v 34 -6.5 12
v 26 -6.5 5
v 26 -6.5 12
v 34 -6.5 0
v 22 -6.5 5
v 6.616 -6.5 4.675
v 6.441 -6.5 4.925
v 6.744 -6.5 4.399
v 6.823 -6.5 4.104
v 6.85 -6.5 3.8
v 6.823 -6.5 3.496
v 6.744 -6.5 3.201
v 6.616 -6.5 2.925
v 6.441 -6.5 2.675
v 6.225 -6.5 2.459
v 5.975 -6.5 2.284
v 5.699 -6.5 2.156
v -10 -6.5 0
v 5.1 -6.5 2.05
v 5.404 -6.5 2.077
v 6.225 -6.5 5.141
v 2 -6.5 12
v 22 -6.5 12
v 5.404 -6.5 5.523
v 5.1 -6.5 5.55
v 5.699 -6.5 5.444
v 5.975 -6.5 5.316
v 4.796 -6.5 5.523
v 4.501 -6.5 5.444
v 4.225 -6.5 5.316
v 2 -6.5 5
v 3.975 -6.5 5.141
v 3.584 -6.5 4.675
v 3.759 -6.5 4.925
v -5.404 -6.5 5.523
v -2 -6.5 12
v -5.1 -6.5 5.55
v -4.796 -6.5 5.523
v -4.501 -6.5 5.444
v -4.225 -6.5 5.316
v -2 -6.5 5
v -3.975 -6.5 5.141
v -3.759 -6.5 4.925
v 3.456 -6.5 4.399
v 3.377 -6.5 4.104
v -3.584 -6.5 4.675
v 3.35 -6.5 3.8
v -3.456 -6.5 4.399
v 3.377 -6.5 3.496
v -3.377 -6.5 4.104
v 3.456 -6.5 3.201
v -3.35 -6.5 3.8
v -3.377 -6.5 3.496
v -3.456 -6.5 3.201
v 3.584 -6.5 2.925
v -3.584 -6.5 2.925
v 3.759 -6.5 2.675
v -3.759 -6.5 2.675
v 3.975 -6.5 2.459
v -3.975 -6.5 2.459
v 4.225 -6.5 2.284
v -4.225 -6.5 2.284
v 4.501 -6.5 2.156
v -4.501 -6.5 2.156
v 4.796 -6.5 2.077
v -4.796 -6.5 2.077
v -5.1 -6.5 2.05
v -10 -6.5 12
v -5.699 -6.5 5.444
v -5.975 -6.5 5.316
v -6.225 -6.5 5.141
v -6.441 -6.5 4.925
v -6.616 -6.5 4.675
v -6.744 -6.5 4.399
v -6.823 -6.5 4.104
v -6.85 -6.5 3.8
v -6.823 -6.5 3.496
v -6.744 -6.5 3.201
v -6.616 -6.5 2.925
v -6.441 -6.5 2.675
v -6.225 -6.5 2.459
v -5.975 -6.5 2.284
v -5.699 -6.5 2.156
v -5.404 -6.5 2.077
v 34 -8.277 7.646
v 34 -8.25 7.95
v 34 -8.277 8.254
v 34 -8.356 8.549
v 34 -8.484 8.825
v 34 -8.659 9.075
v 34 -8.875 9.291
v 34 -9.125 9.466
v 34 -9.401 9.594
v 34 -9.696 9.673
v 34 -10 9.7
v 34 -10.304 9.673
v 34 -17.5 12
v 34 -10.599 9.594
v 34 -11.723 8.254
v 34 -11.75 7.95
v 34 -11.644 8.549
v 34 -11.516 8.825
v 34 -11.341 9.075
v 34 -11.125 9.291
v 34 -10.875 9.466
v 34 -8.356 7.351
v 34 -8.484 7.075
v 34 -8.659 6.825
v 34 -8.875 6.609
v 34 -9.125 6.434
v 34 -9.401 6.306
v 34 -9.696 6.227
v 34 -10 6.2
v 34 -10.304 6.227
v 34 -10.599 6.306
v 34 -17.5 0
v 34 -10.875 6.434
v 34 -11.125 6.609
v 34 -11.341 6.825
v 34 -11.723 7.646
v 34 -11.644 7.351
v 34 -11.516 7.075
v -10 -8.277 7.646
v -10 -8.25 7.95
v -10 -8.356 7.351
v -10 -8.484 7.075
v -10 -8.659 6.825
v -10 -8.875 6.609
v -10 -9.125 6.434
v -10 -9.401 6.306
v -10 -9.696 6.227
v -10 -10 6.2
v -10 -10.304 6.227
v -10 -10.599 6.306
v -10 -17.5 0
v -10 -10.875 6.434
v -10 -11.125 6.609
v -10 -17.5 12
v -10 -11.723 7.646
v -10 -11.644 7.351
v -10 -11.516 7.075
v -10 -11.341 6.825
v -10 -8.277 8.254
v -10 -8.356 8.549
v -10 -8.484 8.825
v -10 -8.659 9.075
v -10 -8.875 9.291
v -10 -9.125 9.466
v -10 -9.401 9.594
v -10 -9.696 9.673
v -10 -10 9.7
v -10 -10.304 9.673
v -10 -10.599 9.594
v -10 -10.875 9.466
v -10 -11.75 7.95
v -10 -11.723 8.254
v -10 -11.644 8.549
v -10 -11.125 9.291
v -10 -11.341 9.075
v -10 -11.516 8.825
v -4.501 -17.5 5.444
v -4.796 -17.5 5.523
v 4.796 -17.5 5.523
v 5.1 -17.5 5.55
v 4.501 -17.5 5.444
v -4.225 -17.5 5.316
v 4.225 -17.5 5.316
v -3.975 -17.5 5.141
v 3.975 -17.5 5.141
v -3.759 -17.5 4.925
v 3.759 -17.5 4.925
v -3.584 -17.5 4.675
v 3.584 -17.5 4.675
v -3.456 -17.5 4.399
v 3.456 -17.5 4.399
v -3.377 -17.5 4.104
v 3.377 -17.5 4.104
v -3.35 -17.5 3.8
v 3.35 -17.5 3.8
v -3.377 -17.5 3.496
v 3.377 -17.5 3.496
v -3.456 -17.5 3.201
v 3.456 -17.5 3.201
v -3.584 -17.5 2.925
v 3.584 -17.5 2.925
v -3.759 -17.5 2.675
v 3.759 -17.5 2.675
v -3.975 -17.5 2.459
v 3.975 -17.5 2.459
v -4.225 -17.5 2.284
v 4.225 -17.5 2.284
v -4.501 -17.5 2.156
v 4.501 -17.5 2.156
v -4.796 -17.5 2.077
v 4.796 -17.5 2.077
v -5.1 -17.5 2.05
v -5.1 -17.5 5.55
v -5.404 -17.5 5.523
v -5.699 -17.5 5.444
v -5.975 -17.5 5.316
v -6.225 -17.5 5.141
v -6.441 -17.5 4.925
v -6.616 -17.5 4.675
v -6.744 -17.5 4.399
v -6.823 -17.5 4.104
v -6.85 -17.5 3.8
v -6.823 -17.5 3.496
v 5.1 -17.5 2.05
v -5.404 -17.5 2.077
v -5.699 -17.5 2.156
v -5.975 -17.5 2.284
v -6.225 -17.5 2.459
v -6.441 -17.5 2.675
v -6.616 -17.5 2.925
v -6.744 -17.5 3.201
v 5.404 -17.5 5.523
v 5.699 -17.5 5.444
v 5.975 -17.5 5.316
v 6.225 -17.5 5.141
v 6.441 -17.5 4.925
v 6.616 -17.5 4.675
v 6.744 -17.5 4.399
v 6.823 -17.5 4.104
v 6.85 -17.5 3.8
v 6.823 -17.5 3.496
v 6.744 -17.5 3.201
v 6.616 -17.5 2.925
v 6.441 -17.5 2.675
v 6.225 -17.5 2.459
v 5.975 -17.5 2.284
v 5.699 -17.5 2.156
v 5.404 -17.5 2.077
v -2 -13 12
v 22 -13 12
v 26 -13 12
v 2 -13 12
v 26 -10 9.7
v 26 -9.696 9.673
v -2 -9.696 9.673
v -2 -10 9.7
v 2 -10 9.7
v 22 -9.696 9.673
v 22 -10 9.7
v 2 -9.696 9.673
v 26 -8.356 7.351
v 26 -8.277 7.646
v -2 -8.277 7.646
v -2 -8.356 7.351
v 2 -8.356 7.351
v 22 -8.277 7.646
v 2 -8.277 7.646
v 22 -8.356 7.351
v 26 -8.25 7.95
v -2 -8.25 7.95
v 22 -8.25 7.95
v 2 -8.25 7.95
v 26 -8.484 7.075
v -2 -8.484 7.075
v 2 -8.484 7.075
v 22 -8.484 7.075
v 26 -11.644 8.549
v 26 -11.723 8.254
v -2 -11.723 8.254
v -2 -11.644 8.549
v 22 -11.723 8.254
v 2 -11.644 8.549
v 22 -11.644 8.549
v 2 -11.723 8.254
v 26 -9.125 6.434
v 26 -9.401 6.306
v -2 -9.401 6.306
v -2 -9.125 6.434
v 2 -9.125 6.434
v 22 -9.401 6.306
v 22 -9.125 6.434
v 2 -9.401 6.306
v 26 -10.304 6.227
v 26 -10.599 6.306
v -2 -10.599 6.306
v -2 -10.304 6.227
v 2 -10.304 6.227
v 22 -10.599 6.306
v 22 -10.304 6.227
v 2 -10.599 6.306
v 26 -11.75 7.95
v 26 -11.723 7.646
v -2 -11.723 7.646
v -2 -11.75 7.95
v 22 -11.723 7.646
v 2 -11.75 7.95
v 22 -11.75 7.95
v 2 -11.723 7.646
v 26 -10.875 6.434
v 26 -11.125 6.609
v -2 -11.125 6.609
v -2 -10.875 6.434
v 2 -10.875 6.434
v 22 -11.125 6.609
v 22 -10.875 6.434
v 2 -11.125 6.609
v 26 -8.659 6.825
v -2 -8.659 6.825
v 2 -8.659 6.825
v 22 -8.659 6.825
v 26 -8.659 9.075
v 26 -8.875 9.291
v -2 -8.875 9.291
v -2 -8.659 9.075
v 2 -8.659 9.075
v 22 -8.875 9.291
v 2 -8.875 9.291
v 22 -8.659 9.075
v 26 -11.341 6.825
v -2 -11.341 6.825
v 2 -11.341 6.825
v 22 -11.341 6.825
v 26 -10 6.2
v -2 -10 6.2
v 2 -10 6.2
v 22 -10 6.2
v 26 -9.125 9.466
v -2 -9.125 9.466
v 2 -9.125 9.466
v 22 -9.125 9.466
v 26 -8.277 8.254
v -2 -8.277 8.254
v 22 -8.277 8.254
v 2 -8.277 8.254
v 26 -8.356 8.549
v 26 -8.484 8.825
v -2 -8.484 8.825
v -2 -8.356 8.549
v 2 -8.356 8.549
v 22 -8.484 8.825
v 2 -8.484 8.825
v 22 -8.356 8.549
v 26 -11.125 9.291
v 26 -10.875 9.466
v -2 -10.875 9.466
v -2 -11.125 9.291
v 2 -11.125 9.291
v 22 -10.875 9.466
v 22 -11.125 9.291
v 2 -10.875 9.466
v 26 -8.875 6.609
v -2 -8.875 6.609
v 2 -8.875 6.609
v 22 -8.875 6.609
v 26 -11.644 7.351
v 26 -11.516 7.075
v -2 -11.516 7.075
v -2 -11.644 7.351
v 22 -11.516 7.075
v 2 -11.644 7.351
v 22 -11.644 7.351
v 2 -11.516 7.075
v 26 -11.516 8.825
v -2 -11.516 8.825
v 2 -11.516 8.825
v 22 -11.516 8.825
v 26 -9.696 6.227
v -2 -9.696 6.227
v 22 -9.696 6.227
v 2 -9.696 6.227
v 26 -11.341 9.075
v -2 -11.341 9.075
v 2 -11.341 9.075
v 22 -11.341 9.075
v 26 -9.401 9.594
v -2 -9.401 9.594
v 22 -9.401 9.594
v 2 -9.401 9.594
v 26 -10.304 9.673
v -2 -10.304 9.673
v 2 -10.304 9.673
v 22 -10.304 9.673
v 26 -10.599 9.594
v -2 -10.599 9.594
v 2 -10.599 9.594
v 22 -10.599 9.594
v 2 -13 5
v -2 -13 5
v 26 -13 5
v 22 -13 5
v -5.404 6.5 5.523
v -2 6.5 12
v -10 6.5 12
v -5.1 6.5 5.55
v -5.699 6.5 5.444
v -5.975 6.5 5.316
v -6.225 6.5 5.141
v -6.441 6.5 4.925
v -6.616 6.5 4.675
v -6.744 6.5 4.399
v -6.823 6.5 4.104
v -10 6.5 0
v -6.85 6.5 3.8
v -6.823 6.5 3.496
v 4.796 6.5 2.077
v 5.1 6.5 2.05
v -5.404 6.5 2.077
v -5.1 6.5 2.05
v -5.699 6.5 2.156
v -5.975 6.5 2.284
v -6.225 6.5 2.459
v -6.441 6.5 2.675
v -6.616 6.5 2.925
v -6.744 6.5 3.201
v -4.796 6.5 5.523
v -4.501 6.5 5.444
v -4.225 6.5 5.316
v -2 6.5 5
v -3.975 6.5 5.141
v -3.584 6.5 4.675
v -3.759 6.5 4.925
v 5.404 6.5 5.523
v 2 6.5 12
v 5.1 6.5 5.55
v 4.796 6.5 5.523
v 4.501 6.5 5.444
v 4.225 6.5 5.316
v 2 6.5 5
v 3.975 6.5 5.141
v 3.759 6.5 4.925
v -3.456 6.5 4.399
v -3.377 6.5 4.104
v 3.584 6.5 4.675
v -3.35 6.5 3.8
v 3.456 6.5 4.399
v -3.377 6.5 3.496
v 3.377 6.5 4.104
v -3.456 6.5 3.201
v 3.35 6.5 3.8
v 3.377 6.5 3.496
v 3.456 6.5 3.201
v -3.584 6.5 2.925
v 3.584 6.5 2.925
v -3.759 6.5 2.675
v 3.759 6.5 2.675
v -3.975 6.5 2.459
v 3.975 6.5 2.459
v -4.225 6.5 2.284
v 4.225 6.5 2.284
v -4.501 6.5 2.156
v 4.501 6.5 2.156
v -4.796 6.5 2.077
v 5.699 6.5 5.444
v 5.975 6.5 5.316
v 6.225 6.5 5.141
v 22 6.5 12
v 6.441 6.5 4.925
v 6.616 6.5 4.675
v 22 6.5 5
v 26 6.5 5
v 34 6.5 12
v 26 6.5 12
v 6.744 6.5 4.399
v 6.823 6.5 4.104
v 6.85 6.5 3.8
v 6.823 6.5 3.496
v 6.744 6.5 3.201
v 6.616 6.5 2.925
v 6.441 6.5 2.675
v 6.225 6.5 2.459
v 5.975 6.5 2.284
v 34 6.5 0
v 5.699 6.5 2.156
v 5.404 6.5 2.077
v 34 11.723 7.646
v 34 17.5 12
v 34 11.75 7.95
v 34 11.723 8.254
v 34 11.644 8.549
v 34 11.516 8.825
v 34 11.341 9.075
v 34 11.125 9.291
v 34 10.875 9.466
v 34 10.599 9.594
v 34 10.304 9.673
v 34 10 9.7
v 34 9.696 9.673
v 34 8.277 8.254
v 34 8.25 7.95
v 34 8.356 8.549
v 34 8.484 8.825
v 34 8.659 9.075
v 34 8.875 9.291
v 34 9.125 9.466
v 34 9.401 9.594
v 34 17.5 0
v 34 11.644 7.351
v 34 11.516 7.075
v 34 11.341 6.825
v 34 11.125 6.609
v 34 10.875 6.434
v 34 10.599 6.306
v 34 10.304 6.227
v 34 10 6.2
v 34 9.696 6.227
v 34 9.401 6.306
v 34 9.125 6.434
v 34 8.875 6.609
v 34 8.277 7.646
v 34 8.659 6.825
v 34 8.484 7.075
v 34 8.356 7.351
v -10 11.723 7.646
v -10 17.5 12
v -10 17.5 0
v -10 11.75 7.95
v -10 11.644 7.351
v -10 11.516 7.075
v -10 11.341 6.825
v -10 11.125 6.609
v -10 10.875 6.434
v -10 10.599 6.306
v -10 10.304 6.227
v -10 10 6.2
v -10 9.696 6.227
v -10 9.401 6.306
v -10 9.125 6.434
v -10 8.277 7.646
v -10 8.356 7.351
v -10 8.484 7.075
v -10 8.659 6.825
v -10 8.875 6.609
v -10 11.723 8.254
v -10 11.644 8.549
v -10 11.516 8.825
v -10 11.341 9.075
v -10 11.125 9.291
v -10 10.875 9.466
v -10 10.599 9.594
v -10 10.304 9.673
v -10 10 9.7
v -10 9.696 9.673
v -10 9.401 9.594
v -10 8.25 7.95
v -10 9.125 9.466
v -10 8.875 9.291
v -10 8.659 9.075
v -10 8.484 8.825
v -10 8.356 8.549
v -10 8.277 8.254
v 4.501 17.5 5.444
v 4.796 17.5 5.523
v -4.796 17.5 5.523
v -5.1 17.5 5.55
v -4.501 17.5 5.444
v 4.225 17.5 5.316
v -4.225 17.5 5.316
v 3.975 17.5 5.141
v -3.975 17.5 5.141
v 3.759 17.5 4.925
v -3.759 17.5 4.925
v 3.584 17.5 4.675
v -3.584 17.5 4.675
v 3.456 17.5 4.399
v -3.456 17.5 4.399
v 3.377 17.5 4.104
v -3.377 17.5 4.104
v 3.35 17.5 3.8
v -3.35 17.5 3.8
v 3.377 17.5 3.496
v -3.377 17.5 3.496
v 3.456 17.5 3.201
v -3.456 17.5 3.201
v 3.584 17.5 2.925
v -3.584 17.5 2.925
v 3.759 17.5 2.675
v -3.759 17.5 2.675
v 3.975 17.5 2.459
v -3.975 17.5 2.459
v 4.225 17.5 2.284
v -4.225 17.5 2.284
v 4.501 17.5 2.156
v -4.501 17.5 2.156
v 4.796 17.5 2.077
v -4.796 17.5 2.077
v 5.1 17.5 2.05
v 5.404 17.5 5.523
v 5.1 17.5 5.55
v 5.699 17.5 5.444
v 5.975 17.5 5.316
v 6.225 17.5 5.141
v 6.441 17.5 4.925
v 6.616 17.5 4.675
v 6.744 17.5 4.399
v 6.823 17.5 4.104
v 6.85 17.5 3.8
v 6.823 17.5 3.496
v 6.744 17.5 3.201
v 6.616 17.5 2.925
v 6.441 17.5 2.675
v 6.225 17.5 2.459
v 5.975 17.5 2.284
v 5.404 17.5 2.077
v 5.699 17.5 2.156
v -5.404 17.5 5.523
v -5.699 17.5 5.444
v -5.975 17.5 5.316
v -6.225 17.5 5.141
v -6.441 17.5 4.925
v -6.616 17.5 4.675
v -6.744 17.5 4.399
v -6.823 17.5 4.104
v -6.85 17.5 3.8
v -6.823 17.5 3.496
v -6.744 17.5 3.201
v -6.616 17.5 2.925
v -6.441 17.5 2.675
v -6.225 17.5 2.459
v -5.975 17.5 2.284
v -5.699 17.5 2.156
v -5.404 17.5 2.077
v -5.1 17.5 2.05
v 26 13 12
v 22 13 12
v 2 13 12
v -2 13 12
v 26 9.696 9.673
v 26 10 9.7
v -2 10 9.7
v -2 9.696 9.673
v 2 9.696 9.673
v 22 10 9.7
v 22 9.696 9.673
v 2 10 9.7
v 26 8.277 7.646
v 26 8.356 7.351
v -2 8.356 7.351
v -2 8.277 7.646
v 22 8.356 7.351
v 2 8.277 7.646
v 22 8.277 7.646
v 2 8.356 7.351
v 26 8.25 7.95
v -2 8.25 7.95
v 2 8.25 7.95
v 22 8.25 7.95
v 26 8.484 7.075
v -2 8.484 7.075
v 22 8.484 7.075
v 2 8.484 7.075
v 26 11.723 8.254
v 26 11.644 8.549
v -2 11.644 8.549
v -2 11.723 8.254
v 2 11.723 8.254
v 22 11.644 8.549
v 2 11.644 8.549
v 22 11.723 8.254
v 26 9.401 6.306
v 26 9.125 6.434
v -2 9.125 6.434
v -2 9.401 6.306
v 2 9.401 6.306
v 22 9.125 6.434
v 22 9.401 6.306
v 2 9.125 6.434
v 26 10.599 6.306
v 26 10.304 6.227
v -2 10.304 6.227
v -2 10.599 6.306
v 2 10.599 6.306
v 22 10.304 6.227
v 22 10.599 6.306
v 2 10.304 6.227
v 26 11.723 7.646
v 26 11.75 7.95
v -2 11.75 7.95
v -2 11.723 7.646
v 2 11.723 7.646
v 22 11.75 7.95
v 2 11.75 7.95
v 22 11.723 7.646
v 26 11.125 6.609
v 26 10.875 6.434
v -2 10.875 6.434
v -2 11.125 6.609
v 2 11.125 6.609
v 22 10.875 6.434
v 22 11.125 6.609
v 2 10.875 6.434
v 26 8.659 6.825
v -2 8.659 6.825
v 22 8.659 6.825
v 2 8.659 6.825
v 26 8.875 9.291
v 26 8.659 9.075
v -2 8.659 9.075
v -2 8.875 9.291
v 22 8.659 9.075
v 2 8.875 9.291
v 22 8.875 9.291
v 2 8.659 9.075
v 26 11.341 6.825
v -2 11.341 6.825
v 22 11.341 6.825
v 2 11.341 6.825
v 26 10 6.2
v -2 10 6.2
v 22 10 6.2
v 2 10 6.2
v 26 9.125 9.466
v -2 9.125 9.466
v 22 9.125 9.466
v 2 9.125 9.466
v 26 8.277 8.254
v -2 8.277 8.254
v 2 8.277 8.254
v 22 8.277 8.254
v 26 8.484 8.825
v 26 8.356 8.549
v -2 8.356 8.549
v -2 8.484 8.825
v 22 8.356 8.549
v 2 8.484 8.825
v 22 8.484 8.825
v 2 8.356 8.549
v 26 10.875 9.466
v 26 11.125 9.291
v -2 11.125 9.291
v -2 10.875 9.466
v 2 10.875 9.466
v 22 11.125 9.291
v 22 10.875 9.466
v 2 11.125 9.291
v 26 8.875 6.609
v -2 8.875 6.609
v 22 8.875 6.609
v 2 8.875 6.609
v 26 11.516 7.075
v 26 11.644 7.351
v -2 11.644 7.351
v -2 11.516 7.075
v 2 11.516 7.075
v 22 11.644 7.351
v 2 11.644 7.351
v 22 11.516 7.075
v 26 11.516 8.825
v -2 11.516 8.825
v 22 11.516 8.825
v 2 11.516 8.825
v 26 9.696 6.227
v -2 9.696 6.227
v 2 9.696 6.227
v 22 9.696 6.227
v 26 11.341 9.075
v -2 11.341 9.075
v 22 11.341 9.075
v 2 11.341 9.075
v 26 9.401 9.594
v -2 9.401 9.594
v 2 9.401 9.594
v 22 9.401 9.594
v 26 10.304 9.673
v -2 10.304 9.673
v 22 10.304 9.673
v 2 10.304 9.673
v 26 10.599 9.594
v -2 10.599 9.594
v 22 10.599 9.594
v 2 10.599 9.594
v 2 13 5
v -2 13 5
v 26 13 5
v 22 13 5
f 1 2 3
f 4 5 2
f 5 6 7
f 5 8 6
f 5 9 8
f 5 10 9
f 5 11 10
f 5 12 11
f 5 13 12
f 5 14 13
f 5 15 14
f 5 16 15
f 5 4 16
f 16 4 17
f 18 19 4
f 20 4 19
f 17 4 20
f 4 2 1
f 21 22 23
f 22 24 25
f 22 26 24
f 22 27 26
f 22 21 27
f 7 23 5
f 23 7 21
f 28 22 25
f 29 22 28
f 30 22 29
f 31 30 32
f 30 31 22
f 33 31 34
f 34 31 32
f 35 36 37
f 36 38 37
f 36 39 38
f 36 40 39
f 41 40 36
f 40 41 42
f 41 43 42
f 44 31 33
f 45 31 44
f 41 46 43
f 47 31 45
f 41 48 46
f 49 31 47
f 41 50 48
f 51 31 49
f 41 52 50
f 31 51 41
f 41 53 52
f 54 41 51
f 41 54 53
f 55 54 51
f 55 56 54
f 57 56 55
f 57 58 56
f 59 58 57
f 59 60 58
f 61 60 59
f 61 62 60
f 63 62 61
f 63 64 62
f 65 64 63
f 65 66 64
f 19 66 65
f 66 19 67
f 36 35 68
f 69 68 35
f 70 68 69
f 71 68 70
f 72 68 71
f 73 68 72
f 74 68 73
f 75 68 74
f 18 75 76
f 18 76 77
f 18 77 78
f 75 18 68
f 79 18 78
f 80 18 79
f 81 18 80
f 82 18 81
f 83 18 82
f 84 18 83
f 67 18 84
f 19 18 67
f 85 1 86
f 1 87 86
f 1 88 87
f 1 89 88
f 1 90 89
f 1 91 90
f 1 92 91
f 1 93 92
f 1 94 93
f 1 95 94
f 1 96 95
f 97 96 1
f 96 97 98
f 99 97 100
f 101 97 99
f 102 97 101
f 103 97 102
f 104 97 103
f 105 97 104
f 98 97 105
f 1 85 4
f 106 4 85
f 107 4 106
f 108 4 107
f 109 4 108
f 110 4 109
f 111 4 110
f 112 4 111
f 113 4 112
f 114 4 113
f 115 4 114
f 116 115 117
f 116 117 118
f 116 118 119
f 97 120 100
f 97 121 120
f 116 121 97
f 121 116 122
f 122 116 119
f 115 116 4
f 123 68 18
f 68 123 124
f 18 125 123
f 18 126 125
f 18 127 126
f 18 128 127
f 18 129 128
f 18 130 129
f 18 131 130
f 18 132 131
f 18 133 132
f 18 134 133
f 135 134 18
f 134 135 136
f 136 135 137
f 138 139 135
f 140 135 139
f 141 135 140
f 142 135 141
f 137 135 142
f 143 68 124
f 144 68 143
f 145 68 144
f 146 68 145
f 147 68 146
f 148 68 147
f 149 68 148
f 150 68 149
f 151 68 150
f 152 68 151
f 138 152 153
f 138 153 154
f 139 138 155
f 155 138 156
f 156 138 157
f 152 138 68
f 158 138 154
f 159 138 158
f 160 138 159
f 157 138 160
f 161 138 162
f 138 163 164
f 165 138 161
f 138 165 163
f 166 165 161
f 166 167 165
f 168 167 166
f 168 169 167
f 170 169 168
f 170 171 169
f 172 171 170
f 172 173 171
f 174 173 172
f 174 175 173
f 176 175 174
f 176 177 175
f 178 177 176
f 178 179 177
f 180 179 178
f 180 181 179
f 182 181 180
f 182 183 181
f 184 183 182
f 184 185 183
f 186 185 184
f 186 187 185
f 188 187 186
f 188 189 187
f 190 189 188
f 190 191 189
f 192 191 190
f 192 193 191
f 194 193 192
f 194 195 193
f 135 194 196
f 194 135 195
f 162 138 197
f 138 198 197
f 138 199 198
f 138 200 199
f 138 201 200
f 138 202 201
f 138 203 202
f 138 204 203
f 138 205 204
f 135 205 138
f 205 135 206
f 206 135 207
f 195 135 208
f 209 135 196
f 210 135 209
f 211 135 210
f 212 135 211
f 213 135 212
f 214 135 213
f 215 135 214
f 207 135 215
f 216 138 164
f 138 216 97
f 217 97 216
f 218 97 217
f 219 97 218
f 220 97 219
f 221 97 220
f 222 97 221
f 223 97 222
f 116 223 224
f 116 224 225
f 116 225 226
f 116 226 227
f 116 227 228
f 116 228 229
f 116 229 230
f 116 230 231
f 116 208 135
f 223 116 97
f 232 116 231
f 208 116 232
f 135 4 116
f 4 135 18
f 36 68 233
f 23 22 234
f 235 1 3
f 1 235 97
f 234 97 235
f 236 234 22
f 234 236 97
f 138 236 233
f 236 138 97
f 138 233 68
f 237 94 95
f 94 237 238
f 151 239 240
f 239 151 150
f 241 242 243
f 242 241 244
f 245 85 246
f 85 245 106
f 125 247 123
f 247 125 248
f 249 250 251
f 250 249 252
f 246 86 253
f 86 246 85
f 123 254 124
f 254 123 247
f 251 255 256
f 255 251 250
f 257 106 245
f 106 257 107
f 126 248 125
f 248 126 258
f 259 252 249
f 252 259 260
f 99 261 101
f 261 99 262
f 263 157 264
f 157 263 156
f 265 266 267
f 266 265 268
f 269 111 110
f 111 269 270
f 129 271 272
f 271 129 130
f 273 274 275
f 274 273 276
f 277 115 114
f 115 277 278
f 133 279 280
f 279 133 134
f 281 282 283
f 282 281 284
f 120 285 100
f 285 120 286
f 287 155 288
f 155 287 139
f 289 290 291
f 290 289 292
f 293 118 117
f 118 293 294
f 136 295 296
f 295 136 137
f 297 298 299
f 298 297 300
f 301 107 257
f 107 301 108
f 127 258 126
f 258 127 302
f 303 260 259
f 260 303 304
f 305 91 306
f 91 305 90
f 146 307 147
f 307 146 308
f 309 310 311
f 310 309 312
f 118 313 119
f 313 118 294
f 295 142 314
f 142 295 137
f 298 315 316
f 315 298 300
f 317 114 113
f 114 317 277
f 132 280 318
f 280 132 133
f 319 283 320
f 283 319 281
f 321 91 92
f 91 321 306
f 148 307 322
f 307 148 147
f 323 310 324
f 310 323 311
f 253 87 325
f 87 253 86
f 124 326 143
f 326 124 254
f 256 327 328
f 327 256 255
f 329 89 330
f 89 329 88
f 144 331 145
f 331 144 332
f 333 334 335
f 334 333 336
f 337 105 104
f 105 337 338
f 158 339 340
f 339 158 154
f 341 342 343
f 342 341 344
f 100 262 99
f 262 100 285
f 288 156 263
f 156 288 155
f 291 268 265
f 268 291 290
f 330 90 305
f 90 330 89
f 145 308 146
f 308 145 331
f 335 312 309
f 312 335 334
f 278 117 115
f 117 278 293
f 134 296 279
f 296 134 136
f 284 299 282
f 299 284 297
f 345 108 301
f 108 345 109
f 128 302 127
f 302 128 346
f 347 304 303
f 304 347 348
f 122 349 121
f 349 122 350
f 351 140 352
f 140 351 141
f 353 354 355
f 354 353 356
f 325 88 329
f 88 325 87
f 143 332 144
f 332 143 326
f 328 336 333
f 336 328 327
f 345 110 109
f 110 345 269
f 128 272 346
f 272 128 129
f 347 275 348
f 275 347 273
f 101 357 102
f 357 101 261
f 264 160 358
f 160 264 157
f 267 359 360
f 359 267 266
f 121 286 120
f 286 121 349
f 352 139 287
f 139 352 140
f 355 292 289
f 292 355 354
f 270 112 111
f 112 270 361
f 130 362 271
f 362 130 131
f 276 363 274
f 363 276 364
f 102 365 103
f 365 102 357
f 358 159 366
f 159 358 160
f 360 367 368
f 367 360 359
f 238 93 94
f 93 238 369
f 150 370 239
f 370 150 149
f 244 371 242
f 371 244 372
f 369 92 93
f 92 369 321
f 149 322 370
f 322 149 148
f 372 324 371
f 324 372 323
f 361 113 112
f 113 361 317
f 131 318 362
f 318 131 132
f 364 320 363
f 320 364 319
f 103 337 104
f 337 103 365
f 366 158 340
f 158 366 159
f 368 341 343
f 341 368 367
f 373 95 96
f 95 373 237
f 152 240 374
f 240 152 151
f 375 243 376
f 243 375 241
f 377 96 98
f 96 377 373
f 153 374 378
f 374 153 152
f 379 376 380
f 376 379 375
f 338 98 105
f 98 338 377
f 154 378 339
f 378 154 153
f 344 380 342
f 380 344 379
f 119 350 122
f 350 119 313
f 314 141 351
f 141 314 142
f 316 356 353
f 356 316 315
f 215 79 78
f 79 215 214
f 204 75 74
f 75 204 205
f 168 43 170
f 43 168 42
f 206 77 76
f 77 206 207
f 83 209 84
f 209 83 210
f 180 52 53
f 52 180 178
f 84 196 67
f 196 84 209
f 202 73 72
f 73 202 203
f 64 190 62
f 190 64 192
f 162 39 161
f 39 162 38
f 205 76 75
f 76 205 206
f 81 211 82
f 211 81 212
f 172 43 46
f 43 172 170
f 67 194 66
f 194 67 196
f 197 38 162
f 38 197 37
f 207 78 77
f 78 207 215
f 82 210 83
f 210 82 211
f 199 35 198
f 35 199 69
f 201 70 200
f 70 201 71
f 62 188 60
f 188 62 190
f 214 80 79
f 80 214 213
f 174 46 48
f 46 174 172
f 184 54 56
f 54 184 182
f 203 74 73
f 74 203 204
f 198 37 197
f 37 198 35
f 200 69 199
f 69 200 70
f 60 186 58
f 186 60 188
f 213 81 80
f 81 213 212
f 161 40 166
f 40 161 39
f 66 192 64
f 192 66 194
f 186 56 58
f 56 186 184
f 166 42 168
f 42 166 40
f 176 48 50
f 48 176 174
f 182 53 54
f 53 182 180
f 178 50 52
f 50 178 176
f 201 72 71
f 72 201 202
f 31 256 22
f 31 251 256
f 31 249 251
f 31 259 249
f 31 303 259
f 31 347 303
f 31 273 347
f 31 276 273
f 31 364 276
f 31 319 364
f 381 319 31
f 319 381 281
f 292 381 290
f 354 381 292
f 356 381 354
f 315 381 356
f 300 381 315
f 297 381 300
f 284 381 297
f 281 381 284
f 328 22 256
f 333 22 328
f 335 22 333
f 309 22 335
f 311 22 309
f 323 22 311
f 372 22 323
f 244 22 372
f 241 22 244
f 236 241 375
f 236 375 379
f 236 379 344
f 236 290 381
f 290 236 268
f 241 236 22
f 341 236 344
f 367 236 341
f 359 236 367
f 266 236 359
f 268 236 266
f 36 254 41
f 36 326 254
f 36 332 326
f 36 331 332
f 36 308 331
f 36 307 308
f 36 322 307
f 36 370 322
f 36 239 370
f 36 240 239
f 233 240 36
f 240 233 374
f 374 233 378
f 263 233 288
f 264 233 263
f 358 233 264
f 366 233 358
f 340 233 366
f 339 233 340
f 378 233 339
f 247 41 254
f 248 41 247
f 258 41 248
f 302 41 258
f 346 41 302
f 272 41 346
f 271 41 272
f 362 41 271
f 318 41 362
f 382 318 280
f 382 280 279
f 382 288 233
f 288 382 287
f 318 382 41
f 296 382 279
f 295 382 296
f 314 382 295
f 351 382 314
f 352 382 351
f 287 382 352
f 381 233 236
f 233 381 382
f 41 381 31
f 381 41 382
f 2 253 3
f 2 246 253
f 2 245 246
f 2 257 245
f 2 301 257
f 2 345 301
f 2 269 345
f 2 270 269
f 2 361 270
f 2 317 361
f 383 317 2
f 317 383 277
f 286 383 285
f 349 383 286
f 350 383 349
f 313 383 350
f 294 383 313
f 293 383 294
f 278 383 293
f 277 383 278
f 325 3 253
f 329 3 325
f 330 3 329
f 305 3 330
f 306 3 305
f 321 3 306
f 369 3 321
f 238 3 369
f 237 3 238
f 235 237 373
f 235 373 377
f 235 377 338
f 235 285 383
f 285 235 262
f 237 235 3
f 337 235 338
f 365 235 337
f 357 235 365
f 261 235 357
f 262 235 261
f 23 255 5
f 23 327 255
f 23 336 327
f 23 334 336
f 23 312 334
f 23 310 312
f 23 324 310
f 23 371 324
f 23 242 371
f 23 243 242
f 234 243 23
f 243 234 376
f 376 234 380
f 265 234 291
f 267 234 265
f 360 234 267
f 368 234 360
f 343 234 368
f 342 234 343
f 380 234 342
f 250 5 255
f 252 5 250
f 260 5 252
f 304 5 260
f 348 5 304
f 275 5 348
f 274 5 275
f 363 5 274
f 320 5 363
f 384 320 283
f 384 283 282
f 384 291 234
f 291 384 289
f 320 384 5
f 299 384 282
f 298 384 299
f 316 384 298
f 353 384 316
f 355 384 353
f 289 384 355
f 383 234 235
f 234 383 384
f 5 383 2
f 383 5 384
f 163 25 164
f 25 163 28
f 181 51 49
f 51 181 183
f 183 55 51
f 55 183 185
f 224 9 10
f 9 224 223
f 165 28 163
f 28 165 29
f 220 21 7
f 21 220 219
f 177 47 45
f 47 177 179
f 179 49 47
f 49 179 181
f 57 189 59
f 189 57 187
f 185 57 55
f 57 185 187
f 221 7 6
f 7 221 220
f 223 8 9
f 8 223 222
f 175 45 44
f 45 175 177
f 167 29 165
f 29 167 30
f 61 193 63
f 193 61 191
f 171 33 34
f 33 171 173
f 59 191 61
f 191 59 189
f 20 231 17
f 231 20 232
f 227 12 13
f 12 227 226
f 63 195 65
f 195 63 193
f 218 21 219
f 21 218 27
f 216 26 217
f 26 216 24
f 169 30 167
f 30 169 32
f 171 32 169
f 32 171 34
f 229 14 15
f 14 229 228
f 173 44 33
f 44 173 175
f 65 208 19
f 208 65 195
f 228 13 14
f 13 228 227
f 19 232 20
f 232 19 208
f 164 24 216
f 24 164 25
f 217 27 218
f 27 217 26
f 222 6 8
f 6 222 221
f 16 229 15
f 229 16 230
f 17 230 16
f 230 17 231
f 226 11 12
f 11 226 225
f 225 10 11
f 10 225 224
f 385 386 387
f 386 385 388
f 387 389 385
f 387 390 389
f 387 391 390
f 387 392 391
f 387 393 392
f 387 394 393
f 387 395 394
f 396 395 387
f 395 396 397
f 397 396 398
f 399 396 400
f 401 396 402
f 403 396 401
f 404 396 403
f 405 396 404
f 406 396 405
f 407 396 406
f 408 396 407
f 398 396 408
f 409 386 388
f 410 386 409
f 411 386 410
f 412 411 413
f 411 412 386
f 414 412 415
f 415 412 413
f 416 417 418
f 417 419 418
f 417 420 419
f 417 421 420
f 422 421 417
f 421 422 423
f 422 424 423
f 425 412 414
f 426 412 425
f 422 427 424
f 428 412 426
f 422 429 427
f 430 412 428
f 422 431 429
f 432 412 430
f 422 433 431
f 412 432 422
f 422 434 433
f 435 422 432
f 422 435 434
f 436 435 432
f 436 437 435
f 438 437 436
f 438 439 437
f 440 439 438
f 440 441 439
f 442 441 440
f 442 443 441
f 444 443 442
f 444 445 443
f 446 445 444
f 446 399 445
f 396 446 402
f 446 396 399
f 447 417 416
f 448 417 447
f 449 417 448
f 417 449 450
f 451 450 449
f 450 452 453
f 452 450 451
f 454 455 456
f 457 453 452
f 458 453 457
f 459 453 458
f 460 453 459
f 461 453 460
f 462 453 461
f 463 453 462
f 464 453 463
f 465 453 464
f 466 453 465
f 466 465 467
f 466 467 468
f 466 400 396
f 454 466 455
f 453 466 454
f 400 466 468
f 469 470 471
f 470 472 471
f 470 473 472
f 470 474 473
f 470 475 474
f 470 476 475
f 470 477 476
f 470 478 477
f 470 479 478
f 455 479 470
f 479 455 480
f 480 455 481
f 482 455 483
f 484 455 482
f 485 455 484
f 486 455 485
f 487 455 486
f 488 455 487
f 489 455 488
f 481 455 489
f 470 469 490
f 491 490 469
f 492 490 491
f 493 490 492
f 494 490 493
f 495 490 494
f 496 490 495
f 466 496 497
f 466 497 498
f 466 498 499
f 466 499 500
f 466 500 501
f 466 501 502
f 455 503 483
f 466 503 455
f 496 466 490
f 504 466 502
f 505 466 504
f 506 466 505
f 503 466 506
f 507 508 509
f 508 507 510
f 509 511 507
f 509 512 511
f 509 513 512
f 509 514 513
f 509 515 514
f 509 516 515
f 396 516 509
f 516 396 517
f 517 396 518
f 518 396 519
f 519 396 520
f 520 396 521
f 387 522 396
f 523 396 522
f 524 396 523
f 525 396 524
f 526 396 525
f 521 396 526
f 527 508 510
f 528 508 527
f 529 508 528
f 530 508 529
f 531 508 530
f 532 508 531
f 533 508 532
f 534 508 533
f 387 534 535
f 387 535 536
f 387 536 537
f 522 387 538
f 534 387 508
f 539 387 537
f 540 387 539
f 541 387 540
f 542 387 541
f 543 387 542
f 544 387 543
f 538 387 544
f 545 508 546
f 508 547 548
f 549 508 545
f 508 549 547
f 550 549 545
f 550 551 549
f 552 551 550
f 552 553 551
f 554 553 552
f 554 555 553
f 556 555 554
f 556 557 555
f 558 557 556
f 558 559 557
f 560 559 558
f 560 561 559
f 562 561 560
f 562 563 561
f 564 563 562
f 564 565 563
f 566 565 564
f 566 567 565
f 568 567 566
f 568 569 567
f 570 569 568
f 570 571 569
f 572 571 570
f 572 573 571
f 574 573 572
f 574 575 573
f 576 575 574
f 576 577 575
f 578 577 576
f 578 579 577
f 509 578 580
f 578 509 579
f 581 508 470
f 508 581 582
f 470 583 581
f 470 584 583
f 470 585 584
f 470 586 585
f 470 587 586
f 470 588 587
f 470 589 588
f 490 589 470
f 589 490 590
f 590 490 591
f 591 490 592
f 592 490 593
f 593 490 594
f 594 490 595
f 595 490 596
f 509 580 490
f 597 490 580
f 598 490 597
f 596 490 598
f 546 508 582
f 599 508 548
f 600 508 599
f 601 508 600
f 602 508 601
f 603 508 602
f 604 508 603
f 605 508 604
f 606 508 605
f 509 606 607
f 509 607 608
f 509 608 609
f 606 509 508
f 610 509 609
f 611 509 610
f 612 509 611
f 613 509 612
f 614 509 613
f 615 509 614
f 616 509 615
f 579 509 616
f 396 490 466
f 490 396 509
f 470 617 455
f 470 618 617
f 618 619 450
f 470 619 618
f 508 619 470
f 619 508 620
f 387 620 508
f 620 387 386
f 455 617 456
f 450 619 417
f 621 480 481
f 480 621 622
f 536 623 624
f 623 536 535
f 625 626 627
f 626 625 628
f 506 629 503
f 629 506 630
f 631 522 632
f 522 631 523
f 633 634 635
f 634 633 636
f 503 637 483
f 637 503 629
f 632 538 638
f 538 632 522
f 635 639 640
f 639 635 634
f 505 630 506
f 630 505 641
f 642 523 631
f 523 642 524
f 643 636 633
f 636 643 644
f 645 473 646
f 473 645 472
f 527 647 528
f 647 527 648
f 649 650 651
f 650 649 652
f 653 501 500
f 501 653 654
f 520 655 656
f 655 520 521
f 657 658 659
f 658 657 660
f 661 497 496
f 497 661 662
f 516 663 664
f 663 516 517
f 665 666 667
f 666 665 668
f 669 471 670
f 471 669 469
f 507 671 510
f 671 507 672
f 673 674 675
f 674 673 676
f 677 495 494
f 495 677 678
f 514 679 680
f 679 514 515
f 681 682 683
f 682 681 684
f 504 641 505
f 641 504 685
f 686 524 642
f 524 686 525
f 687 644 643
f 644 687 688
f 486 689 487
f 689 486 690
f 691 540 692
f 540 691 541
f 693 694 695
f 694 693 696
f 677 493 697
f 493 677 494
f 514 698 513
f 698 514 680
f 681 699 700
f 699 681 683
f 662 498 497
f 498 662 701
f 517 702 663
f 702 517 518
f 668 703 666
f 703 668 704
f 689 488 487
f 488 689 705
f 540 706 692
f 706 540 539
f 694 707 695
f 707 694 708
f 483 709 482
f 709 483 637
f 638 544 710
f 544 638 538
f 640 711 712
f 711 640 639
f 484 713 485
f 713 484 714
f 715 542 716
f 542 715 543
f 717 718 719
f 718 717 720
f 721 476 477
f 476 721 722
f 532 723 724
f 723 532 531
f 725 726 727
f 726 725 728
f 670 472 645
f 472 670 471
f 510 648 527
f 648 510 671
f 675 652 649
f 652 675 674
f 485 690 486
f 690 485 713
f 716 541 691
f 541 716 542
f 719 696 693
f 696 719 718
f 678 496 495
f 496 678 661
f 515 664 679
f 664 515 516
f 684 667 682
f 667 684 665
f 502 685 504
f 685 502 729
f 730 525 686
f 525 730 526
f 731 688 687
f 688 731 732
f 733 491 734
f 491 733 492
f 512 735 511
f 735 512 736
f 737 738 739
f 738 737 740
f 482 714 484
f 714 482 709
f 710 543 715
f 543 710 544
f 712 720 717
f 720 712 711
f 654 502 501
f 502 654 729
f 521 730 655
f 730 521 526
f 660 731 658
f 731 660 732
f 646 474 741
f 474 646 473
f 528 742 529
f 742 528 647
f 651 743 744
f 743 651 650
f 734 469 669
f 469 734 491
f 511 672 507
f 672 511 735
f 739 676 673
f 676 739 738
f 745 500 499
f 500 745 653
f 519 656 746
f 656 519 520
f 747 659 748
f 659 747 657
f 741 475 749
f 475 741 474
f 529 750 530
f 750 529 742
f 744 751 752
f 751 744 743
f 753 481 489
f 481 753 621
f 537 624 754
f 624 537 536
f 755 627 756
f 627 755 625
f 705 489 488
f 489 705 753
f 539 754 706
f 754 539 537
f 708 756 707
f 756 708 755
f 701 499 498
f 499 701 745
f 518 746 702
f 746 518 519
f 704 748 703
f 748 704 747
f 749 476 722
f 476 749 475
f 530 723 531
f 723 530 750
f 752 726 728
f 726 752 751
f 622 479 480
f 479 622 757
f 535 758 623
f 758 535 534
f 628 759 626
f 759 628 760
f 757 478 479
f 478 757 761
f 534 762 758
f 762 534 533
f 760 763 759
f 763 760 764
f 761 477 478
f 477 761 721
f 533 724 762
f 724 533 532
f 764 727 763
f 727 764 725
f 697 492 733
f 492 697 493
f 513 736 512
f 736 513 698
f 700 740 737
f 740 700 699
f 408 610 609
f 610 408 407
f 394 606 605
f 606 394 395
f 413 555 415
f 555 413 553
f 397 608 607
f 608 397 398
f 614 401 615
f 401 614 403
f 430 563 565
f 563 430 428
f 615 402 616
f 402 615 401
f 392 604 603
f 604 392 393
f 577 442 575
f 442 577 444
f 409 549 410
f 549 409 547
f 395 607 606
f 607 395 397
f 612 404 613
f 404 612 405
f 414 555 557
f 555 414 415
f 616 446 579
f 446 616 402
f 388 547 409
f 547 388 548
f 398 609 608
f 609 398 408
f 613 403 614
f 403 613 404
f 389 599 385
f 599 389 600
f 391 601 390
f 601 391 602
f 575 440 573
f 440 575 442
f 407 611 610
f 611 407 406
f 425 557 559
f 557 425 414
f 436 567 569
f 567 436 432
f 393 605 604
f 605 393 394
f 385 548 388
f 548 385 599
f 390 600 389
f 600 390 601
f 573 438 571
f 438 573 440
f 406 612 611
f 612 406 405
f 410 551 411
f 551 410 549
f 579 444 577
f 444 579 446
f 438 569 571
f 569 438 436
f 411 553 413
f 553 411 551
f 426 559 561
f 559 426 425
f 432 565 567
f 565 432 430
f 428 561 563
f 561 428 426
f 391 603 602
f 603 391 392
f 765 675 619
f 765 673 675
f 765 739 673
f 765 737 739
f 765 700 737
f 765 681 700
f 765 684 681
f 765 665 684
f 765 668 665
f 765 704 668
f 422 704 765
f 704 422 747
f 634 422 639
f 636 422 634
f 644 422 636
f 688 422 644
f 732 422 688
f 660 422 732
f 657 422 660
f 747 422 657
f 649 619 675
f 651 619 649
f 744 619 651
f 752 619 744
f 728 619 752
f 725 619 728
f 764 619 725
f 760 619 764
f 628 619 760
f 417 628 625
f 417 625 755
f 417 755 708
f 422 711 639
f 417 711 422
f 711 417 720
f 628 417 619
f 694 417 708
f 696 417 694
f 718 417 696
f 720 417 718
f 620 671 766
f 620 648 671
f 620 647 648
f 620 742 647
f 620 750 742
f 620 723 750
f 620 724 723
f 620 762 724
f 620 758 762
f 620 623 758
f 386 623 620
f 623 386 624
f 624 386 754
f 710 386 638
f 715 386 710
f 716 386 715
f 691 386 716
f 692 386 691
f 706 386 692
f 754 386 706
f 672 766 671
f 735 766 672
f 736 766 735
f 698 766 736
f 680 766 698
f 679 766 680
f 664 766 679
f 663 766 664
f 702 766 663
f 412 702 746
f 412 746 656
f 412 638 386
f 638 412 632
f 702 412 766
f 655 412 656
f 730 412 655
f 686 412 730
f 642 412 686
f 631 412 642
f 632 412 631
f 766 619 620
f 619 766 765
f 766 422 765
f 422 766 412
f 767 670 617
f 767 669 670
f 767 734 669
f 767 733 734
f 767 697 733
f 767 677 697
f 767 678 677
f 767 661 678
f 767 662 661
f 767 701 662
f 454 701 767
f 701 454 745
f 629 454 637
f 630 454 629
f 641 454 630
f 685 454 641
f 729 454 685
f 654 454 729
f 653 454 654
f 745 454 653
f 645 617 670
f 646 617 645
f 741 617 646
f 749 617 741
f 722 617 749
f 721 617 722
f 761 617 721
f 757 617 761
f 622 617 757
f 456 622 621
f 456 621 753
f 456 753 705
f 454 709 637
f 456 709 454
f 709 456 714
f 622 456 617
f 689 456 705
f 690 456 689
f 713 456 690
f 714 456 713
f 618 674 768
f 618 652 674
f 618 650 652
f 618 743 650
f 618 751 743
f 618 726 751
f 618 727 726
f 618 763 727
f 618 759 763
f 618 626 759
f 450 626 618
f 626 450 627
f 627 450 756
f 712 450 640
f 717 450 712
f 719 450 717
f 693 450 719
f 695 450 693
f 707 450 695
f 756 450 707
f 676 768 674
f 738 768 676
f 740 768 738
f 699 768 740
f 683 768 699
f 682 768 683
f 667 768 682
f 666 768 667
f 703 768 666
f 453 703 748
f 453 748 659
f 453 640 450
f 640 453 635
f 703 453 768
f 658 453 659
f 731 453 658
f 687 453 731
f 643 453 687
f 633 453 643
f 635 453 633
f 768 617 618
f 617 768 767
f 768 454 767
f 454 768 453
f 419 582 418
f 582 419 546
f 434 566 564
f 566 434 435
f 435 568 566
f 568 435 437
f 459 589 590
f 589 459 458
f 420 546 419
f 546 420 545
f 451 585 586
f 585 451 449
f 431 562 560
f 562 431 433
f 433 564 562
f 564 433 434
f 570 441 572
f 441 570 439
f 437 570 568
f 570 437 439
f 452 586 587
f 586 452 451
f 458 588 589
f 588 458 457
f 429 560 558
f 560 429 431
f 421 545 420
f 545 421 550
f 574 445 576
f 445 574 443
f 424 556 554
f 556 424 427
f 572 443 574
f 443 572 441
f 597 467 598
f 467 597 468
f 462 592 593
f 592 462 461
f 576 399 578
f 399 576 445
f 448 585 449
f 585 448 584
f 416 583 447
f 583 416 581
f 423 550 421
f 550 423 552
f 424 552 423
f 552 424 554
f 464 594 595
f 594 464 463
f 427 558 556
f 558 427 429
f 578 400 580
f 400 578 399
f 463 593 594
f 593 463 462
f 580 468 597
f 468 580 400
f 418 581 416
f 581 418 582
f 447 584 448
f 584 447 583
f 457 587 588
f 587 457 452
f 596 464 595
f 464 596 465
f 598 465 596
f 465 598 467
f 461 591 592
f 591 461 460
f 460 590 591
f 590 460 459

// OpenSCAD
// file: raspirobot.scad
body_roundedness = 4;

body_thickness = 3;
body_width = 65;
body_length = 100;

body_offset = 0;

upper_body_offset = 24;

raspi_width = 56;
raspi_length = 85.6;
raspi_height = 21;
raspi_base = 3.6;
raspi_offset_y = 0.35;

raspi_holes = [
    [24.5, 39],
    [-24.5, 39],
    [24.5, -19],
    [-24.5, -19]
];

servo_holes = [
    [-14, -5],
    [-14, -15],
    [35, -5],
    [35, -15]
];

raspi_hole_size = 3.5;

servo_width = 40;
servo_length = 35;
servo_height = 20;

servo_spread = 6;
servo_pos = 20;

wheel_diameter = 56;
wheel_thickness = 5;
wheel_offset = 16.5;
wheel_pos = 20;

support_wheel_radius =
      wheel_diameter/2
    - servo_height/2
    - body_thickness/2;
    
support_wheel_pos = -30;

module tubes() {
    linear_extrude(
        height = 3
    ) {
        for (hole = raspi_holes) {
            translate(hole)
            difference() {
                circle(d = raspi_hole_size + 1, $fn=30);
                circle(d = raspi_hole_size, $fn=30);
            }
        }
    }
}


module body_shape() {
        difference() {
            offset(r = body_roundedness) {
                scale([
                    body_width - 2*body_roundedness,
                    body_length - 2*body_roundedness
                ])
                square(1, center = true);
            }
            for (hole = raspi_holes) {
                translate(hole)
                circle(d=raspi_hole_size, $fn=30);
            }
    }
}


module body() {
    linear_extrude(
        height = body_thickness
    ) {
        body_shape();
    }
}

module support_wheel() {
    wheel_width=10;
    
    translate([0,0,-support_wheel_radius/2])
    color("black")
    rotate([0,90,0])
    cylinder(h=wheel_width, d=support_wheel_radius, center=true);
    
    translate([wheel_width/2,-support_wheel_radius/2,0])
    rotate([0,90,0])
    color("silver")
    linear_extrude(
        height=2
    ) {
      polygon([
        [0,0],
        [0,support_wheel_radius],
        [support_wheel_radius/2, support_wheel_radius/2]
      ]);
    }
    
    translate([-wheel_width/2 - 2,-support_wheel_radius/2,0])
    rotate([0,90,0])
    color("silver")
    linear_extrude(
        height=2
    ) {
      polygon([
        [0,0],
        [0,support_wheel_radius],
        [support_wheel_radius/2, support_wheel_radius/2]
      ]);
    }
}

module spacer(hole_pos) {
    difference() {
        translate([-2,
                    1,
                    upper_body_offset/2
                    + body_offset/2])
        scale([11, 12, servo_height
                        + upper_body_offset
                        + body_offset])
        cube(center=true);
        
        translate([0, -hole_pos, 0])
        cylinder(
            h=servo_height+2*upper_body_offset + 4,
            d=raspi_hole_size,
            center=true,
            $fn=36);
        
        translate([0, 3.2, -5.1])
        rotate([0, 90, 0])
        cylinder(
            h=20,
            d=3.5,
            center=true,
            $fn=36);
            
        translate([2, -3, 0])
        scale([10,10,4])
        cube(center=true);
        
        translate([2, -3, 24])
        scale([10,10,4])
        cube(center=true);
        
        translate([0, 3.2, 5.1])
        rotate([0, 90, 0])
        cylinder(
            h=20,
            d=3.5,
            center=true,
            $fn=36);
    }
}

module spacer1() {
    spacer(0.95);
}

module spacer2() {
    scale([-1,1,1]) spacer(0.95);
}

// rotate( [ 90, 0, 0 ] ) {
rotate( [30, 0, 0] ) rotate ( [0, 0, 45] ){
// rotate( [30, 0, 0] ) rotate ( [0, 0, 135] ){

// rotate( [-30, 0, 0] ) rotate ( [0, 0, 45] ){

for (hole_xy = raspi_holes) {
    color("silver")
    translate([hole_xy[0], hole_xy[1], 12.5])
    import("m3nut.stl");
    color("silver")
    translate([hole_xy[0], hole_xy[1], -3.1])
    scale([1,1,-1])
    import("m3x20.stl");
    color("silver")
    translate([hole_xy[0], hole_xy[1], -12])
    import("m3nut.stl");
    color("silver")
    translate([hole_xy[0], hole_xy[1], 11.4])
    import("m3x20.stl");
}

for (hole_yz = servo_holes) {
    color("silver")
    translate([18.5, hole_yz[0], hole_yz[1]])
    rotate([0, 90, 0])
    import("m3nut.stl");
    color("silver")
    translate([14, hole_yz[0], hole_yz[1]])
    rotate([0, 90, 0])
    import("m3x20.stl");
    color("silver")
    translate([-20.9, hole_yz[0], hole_yz[1]])
    rotate([0, 90, 0])
    import("m3nut.stl");
    color("silver")
    translate([-14, hole_yz[0], hole_yz[1]])
    rotate([0, -90, 0])
    import("m3x20.stl");
}

translate([-24.5, -17.5, -servo_height/2 - body_offset])
color("pink")
spacer1();

translate([24.5, -17.5, -servo_height/2 - body_offset])
color("pink")
spacer2();

translate([-24.5, 38, -servo_height/2 - body_offset])
rotate([0,0,180])
color("pink")
spacer2();

translate([24.5, 38, -servo_height/2 - body_offset])
rotate([0,0,180])
color("pink")
spacer1();


translate([0,0,-servo_height - body_thickness - body_offset])
body();
 
translate([0,0,upper_body_offset])
body();

translate([
    raspi_width/2 + wheel_thickness + wheel_offset,
    wheel_pos,
    -body_thickness - servo_height/2 - body_offset
])
rotate([0, 90, 0])
color("grey")
cylinder(h=wheel_thickness, r=wheel_diameter/2, center=true);

translate([
    -raspi_width/2 - wheel_thickness - wheel_offset,
    wheel_pos,
    -body_thickness - servo_height/2 - body_offset
])
rotate([0, 90, 0])
color("grey")
cylinder(
    h=wheel_thickness,
    r=wheel_diameter/2,
    center=true
);

color("pink")
translate(
    [0,
     0,
     upper_body_offset + body_thickness + 0.1
])
tubes();

translate([
    0,
    support_wheel_pos,
    -(servo_height + body_thickness + body_offset)
])
support_wheel();


translate([
    raspi_width/2,
    -raspi_length/2 + raspi_offset_y,
    upper_body_offset+body_thickness+raspi_base
])
rotate([0,0,90])
color("green")
import("raspberrypi2.stl");

translate([
    -servo_spread,
    servo_pos,
    -(servo_height/2) - body_offset
])
scale([10, -9.9, 10])
rotate([0,90,90])
color("blue")
import("standardservo.stl");

translate([
    servo_spread,
    servo_pos,
    -(servo_height/2) - body_offset
])
scale([-10, -9.9, 10])
rotate([0,90,90])
color("blue")
import("standardservo.stl");

}
// main file
use <raspirobot.scad>

translate([0,-10,7])
    rotate([270,0,0])
        rotate([0,90,0])
            spacer2();
            
translate([0,10,7])
    rotate([270,0,0])
        rotate([0,90,0])
            spacer1();
